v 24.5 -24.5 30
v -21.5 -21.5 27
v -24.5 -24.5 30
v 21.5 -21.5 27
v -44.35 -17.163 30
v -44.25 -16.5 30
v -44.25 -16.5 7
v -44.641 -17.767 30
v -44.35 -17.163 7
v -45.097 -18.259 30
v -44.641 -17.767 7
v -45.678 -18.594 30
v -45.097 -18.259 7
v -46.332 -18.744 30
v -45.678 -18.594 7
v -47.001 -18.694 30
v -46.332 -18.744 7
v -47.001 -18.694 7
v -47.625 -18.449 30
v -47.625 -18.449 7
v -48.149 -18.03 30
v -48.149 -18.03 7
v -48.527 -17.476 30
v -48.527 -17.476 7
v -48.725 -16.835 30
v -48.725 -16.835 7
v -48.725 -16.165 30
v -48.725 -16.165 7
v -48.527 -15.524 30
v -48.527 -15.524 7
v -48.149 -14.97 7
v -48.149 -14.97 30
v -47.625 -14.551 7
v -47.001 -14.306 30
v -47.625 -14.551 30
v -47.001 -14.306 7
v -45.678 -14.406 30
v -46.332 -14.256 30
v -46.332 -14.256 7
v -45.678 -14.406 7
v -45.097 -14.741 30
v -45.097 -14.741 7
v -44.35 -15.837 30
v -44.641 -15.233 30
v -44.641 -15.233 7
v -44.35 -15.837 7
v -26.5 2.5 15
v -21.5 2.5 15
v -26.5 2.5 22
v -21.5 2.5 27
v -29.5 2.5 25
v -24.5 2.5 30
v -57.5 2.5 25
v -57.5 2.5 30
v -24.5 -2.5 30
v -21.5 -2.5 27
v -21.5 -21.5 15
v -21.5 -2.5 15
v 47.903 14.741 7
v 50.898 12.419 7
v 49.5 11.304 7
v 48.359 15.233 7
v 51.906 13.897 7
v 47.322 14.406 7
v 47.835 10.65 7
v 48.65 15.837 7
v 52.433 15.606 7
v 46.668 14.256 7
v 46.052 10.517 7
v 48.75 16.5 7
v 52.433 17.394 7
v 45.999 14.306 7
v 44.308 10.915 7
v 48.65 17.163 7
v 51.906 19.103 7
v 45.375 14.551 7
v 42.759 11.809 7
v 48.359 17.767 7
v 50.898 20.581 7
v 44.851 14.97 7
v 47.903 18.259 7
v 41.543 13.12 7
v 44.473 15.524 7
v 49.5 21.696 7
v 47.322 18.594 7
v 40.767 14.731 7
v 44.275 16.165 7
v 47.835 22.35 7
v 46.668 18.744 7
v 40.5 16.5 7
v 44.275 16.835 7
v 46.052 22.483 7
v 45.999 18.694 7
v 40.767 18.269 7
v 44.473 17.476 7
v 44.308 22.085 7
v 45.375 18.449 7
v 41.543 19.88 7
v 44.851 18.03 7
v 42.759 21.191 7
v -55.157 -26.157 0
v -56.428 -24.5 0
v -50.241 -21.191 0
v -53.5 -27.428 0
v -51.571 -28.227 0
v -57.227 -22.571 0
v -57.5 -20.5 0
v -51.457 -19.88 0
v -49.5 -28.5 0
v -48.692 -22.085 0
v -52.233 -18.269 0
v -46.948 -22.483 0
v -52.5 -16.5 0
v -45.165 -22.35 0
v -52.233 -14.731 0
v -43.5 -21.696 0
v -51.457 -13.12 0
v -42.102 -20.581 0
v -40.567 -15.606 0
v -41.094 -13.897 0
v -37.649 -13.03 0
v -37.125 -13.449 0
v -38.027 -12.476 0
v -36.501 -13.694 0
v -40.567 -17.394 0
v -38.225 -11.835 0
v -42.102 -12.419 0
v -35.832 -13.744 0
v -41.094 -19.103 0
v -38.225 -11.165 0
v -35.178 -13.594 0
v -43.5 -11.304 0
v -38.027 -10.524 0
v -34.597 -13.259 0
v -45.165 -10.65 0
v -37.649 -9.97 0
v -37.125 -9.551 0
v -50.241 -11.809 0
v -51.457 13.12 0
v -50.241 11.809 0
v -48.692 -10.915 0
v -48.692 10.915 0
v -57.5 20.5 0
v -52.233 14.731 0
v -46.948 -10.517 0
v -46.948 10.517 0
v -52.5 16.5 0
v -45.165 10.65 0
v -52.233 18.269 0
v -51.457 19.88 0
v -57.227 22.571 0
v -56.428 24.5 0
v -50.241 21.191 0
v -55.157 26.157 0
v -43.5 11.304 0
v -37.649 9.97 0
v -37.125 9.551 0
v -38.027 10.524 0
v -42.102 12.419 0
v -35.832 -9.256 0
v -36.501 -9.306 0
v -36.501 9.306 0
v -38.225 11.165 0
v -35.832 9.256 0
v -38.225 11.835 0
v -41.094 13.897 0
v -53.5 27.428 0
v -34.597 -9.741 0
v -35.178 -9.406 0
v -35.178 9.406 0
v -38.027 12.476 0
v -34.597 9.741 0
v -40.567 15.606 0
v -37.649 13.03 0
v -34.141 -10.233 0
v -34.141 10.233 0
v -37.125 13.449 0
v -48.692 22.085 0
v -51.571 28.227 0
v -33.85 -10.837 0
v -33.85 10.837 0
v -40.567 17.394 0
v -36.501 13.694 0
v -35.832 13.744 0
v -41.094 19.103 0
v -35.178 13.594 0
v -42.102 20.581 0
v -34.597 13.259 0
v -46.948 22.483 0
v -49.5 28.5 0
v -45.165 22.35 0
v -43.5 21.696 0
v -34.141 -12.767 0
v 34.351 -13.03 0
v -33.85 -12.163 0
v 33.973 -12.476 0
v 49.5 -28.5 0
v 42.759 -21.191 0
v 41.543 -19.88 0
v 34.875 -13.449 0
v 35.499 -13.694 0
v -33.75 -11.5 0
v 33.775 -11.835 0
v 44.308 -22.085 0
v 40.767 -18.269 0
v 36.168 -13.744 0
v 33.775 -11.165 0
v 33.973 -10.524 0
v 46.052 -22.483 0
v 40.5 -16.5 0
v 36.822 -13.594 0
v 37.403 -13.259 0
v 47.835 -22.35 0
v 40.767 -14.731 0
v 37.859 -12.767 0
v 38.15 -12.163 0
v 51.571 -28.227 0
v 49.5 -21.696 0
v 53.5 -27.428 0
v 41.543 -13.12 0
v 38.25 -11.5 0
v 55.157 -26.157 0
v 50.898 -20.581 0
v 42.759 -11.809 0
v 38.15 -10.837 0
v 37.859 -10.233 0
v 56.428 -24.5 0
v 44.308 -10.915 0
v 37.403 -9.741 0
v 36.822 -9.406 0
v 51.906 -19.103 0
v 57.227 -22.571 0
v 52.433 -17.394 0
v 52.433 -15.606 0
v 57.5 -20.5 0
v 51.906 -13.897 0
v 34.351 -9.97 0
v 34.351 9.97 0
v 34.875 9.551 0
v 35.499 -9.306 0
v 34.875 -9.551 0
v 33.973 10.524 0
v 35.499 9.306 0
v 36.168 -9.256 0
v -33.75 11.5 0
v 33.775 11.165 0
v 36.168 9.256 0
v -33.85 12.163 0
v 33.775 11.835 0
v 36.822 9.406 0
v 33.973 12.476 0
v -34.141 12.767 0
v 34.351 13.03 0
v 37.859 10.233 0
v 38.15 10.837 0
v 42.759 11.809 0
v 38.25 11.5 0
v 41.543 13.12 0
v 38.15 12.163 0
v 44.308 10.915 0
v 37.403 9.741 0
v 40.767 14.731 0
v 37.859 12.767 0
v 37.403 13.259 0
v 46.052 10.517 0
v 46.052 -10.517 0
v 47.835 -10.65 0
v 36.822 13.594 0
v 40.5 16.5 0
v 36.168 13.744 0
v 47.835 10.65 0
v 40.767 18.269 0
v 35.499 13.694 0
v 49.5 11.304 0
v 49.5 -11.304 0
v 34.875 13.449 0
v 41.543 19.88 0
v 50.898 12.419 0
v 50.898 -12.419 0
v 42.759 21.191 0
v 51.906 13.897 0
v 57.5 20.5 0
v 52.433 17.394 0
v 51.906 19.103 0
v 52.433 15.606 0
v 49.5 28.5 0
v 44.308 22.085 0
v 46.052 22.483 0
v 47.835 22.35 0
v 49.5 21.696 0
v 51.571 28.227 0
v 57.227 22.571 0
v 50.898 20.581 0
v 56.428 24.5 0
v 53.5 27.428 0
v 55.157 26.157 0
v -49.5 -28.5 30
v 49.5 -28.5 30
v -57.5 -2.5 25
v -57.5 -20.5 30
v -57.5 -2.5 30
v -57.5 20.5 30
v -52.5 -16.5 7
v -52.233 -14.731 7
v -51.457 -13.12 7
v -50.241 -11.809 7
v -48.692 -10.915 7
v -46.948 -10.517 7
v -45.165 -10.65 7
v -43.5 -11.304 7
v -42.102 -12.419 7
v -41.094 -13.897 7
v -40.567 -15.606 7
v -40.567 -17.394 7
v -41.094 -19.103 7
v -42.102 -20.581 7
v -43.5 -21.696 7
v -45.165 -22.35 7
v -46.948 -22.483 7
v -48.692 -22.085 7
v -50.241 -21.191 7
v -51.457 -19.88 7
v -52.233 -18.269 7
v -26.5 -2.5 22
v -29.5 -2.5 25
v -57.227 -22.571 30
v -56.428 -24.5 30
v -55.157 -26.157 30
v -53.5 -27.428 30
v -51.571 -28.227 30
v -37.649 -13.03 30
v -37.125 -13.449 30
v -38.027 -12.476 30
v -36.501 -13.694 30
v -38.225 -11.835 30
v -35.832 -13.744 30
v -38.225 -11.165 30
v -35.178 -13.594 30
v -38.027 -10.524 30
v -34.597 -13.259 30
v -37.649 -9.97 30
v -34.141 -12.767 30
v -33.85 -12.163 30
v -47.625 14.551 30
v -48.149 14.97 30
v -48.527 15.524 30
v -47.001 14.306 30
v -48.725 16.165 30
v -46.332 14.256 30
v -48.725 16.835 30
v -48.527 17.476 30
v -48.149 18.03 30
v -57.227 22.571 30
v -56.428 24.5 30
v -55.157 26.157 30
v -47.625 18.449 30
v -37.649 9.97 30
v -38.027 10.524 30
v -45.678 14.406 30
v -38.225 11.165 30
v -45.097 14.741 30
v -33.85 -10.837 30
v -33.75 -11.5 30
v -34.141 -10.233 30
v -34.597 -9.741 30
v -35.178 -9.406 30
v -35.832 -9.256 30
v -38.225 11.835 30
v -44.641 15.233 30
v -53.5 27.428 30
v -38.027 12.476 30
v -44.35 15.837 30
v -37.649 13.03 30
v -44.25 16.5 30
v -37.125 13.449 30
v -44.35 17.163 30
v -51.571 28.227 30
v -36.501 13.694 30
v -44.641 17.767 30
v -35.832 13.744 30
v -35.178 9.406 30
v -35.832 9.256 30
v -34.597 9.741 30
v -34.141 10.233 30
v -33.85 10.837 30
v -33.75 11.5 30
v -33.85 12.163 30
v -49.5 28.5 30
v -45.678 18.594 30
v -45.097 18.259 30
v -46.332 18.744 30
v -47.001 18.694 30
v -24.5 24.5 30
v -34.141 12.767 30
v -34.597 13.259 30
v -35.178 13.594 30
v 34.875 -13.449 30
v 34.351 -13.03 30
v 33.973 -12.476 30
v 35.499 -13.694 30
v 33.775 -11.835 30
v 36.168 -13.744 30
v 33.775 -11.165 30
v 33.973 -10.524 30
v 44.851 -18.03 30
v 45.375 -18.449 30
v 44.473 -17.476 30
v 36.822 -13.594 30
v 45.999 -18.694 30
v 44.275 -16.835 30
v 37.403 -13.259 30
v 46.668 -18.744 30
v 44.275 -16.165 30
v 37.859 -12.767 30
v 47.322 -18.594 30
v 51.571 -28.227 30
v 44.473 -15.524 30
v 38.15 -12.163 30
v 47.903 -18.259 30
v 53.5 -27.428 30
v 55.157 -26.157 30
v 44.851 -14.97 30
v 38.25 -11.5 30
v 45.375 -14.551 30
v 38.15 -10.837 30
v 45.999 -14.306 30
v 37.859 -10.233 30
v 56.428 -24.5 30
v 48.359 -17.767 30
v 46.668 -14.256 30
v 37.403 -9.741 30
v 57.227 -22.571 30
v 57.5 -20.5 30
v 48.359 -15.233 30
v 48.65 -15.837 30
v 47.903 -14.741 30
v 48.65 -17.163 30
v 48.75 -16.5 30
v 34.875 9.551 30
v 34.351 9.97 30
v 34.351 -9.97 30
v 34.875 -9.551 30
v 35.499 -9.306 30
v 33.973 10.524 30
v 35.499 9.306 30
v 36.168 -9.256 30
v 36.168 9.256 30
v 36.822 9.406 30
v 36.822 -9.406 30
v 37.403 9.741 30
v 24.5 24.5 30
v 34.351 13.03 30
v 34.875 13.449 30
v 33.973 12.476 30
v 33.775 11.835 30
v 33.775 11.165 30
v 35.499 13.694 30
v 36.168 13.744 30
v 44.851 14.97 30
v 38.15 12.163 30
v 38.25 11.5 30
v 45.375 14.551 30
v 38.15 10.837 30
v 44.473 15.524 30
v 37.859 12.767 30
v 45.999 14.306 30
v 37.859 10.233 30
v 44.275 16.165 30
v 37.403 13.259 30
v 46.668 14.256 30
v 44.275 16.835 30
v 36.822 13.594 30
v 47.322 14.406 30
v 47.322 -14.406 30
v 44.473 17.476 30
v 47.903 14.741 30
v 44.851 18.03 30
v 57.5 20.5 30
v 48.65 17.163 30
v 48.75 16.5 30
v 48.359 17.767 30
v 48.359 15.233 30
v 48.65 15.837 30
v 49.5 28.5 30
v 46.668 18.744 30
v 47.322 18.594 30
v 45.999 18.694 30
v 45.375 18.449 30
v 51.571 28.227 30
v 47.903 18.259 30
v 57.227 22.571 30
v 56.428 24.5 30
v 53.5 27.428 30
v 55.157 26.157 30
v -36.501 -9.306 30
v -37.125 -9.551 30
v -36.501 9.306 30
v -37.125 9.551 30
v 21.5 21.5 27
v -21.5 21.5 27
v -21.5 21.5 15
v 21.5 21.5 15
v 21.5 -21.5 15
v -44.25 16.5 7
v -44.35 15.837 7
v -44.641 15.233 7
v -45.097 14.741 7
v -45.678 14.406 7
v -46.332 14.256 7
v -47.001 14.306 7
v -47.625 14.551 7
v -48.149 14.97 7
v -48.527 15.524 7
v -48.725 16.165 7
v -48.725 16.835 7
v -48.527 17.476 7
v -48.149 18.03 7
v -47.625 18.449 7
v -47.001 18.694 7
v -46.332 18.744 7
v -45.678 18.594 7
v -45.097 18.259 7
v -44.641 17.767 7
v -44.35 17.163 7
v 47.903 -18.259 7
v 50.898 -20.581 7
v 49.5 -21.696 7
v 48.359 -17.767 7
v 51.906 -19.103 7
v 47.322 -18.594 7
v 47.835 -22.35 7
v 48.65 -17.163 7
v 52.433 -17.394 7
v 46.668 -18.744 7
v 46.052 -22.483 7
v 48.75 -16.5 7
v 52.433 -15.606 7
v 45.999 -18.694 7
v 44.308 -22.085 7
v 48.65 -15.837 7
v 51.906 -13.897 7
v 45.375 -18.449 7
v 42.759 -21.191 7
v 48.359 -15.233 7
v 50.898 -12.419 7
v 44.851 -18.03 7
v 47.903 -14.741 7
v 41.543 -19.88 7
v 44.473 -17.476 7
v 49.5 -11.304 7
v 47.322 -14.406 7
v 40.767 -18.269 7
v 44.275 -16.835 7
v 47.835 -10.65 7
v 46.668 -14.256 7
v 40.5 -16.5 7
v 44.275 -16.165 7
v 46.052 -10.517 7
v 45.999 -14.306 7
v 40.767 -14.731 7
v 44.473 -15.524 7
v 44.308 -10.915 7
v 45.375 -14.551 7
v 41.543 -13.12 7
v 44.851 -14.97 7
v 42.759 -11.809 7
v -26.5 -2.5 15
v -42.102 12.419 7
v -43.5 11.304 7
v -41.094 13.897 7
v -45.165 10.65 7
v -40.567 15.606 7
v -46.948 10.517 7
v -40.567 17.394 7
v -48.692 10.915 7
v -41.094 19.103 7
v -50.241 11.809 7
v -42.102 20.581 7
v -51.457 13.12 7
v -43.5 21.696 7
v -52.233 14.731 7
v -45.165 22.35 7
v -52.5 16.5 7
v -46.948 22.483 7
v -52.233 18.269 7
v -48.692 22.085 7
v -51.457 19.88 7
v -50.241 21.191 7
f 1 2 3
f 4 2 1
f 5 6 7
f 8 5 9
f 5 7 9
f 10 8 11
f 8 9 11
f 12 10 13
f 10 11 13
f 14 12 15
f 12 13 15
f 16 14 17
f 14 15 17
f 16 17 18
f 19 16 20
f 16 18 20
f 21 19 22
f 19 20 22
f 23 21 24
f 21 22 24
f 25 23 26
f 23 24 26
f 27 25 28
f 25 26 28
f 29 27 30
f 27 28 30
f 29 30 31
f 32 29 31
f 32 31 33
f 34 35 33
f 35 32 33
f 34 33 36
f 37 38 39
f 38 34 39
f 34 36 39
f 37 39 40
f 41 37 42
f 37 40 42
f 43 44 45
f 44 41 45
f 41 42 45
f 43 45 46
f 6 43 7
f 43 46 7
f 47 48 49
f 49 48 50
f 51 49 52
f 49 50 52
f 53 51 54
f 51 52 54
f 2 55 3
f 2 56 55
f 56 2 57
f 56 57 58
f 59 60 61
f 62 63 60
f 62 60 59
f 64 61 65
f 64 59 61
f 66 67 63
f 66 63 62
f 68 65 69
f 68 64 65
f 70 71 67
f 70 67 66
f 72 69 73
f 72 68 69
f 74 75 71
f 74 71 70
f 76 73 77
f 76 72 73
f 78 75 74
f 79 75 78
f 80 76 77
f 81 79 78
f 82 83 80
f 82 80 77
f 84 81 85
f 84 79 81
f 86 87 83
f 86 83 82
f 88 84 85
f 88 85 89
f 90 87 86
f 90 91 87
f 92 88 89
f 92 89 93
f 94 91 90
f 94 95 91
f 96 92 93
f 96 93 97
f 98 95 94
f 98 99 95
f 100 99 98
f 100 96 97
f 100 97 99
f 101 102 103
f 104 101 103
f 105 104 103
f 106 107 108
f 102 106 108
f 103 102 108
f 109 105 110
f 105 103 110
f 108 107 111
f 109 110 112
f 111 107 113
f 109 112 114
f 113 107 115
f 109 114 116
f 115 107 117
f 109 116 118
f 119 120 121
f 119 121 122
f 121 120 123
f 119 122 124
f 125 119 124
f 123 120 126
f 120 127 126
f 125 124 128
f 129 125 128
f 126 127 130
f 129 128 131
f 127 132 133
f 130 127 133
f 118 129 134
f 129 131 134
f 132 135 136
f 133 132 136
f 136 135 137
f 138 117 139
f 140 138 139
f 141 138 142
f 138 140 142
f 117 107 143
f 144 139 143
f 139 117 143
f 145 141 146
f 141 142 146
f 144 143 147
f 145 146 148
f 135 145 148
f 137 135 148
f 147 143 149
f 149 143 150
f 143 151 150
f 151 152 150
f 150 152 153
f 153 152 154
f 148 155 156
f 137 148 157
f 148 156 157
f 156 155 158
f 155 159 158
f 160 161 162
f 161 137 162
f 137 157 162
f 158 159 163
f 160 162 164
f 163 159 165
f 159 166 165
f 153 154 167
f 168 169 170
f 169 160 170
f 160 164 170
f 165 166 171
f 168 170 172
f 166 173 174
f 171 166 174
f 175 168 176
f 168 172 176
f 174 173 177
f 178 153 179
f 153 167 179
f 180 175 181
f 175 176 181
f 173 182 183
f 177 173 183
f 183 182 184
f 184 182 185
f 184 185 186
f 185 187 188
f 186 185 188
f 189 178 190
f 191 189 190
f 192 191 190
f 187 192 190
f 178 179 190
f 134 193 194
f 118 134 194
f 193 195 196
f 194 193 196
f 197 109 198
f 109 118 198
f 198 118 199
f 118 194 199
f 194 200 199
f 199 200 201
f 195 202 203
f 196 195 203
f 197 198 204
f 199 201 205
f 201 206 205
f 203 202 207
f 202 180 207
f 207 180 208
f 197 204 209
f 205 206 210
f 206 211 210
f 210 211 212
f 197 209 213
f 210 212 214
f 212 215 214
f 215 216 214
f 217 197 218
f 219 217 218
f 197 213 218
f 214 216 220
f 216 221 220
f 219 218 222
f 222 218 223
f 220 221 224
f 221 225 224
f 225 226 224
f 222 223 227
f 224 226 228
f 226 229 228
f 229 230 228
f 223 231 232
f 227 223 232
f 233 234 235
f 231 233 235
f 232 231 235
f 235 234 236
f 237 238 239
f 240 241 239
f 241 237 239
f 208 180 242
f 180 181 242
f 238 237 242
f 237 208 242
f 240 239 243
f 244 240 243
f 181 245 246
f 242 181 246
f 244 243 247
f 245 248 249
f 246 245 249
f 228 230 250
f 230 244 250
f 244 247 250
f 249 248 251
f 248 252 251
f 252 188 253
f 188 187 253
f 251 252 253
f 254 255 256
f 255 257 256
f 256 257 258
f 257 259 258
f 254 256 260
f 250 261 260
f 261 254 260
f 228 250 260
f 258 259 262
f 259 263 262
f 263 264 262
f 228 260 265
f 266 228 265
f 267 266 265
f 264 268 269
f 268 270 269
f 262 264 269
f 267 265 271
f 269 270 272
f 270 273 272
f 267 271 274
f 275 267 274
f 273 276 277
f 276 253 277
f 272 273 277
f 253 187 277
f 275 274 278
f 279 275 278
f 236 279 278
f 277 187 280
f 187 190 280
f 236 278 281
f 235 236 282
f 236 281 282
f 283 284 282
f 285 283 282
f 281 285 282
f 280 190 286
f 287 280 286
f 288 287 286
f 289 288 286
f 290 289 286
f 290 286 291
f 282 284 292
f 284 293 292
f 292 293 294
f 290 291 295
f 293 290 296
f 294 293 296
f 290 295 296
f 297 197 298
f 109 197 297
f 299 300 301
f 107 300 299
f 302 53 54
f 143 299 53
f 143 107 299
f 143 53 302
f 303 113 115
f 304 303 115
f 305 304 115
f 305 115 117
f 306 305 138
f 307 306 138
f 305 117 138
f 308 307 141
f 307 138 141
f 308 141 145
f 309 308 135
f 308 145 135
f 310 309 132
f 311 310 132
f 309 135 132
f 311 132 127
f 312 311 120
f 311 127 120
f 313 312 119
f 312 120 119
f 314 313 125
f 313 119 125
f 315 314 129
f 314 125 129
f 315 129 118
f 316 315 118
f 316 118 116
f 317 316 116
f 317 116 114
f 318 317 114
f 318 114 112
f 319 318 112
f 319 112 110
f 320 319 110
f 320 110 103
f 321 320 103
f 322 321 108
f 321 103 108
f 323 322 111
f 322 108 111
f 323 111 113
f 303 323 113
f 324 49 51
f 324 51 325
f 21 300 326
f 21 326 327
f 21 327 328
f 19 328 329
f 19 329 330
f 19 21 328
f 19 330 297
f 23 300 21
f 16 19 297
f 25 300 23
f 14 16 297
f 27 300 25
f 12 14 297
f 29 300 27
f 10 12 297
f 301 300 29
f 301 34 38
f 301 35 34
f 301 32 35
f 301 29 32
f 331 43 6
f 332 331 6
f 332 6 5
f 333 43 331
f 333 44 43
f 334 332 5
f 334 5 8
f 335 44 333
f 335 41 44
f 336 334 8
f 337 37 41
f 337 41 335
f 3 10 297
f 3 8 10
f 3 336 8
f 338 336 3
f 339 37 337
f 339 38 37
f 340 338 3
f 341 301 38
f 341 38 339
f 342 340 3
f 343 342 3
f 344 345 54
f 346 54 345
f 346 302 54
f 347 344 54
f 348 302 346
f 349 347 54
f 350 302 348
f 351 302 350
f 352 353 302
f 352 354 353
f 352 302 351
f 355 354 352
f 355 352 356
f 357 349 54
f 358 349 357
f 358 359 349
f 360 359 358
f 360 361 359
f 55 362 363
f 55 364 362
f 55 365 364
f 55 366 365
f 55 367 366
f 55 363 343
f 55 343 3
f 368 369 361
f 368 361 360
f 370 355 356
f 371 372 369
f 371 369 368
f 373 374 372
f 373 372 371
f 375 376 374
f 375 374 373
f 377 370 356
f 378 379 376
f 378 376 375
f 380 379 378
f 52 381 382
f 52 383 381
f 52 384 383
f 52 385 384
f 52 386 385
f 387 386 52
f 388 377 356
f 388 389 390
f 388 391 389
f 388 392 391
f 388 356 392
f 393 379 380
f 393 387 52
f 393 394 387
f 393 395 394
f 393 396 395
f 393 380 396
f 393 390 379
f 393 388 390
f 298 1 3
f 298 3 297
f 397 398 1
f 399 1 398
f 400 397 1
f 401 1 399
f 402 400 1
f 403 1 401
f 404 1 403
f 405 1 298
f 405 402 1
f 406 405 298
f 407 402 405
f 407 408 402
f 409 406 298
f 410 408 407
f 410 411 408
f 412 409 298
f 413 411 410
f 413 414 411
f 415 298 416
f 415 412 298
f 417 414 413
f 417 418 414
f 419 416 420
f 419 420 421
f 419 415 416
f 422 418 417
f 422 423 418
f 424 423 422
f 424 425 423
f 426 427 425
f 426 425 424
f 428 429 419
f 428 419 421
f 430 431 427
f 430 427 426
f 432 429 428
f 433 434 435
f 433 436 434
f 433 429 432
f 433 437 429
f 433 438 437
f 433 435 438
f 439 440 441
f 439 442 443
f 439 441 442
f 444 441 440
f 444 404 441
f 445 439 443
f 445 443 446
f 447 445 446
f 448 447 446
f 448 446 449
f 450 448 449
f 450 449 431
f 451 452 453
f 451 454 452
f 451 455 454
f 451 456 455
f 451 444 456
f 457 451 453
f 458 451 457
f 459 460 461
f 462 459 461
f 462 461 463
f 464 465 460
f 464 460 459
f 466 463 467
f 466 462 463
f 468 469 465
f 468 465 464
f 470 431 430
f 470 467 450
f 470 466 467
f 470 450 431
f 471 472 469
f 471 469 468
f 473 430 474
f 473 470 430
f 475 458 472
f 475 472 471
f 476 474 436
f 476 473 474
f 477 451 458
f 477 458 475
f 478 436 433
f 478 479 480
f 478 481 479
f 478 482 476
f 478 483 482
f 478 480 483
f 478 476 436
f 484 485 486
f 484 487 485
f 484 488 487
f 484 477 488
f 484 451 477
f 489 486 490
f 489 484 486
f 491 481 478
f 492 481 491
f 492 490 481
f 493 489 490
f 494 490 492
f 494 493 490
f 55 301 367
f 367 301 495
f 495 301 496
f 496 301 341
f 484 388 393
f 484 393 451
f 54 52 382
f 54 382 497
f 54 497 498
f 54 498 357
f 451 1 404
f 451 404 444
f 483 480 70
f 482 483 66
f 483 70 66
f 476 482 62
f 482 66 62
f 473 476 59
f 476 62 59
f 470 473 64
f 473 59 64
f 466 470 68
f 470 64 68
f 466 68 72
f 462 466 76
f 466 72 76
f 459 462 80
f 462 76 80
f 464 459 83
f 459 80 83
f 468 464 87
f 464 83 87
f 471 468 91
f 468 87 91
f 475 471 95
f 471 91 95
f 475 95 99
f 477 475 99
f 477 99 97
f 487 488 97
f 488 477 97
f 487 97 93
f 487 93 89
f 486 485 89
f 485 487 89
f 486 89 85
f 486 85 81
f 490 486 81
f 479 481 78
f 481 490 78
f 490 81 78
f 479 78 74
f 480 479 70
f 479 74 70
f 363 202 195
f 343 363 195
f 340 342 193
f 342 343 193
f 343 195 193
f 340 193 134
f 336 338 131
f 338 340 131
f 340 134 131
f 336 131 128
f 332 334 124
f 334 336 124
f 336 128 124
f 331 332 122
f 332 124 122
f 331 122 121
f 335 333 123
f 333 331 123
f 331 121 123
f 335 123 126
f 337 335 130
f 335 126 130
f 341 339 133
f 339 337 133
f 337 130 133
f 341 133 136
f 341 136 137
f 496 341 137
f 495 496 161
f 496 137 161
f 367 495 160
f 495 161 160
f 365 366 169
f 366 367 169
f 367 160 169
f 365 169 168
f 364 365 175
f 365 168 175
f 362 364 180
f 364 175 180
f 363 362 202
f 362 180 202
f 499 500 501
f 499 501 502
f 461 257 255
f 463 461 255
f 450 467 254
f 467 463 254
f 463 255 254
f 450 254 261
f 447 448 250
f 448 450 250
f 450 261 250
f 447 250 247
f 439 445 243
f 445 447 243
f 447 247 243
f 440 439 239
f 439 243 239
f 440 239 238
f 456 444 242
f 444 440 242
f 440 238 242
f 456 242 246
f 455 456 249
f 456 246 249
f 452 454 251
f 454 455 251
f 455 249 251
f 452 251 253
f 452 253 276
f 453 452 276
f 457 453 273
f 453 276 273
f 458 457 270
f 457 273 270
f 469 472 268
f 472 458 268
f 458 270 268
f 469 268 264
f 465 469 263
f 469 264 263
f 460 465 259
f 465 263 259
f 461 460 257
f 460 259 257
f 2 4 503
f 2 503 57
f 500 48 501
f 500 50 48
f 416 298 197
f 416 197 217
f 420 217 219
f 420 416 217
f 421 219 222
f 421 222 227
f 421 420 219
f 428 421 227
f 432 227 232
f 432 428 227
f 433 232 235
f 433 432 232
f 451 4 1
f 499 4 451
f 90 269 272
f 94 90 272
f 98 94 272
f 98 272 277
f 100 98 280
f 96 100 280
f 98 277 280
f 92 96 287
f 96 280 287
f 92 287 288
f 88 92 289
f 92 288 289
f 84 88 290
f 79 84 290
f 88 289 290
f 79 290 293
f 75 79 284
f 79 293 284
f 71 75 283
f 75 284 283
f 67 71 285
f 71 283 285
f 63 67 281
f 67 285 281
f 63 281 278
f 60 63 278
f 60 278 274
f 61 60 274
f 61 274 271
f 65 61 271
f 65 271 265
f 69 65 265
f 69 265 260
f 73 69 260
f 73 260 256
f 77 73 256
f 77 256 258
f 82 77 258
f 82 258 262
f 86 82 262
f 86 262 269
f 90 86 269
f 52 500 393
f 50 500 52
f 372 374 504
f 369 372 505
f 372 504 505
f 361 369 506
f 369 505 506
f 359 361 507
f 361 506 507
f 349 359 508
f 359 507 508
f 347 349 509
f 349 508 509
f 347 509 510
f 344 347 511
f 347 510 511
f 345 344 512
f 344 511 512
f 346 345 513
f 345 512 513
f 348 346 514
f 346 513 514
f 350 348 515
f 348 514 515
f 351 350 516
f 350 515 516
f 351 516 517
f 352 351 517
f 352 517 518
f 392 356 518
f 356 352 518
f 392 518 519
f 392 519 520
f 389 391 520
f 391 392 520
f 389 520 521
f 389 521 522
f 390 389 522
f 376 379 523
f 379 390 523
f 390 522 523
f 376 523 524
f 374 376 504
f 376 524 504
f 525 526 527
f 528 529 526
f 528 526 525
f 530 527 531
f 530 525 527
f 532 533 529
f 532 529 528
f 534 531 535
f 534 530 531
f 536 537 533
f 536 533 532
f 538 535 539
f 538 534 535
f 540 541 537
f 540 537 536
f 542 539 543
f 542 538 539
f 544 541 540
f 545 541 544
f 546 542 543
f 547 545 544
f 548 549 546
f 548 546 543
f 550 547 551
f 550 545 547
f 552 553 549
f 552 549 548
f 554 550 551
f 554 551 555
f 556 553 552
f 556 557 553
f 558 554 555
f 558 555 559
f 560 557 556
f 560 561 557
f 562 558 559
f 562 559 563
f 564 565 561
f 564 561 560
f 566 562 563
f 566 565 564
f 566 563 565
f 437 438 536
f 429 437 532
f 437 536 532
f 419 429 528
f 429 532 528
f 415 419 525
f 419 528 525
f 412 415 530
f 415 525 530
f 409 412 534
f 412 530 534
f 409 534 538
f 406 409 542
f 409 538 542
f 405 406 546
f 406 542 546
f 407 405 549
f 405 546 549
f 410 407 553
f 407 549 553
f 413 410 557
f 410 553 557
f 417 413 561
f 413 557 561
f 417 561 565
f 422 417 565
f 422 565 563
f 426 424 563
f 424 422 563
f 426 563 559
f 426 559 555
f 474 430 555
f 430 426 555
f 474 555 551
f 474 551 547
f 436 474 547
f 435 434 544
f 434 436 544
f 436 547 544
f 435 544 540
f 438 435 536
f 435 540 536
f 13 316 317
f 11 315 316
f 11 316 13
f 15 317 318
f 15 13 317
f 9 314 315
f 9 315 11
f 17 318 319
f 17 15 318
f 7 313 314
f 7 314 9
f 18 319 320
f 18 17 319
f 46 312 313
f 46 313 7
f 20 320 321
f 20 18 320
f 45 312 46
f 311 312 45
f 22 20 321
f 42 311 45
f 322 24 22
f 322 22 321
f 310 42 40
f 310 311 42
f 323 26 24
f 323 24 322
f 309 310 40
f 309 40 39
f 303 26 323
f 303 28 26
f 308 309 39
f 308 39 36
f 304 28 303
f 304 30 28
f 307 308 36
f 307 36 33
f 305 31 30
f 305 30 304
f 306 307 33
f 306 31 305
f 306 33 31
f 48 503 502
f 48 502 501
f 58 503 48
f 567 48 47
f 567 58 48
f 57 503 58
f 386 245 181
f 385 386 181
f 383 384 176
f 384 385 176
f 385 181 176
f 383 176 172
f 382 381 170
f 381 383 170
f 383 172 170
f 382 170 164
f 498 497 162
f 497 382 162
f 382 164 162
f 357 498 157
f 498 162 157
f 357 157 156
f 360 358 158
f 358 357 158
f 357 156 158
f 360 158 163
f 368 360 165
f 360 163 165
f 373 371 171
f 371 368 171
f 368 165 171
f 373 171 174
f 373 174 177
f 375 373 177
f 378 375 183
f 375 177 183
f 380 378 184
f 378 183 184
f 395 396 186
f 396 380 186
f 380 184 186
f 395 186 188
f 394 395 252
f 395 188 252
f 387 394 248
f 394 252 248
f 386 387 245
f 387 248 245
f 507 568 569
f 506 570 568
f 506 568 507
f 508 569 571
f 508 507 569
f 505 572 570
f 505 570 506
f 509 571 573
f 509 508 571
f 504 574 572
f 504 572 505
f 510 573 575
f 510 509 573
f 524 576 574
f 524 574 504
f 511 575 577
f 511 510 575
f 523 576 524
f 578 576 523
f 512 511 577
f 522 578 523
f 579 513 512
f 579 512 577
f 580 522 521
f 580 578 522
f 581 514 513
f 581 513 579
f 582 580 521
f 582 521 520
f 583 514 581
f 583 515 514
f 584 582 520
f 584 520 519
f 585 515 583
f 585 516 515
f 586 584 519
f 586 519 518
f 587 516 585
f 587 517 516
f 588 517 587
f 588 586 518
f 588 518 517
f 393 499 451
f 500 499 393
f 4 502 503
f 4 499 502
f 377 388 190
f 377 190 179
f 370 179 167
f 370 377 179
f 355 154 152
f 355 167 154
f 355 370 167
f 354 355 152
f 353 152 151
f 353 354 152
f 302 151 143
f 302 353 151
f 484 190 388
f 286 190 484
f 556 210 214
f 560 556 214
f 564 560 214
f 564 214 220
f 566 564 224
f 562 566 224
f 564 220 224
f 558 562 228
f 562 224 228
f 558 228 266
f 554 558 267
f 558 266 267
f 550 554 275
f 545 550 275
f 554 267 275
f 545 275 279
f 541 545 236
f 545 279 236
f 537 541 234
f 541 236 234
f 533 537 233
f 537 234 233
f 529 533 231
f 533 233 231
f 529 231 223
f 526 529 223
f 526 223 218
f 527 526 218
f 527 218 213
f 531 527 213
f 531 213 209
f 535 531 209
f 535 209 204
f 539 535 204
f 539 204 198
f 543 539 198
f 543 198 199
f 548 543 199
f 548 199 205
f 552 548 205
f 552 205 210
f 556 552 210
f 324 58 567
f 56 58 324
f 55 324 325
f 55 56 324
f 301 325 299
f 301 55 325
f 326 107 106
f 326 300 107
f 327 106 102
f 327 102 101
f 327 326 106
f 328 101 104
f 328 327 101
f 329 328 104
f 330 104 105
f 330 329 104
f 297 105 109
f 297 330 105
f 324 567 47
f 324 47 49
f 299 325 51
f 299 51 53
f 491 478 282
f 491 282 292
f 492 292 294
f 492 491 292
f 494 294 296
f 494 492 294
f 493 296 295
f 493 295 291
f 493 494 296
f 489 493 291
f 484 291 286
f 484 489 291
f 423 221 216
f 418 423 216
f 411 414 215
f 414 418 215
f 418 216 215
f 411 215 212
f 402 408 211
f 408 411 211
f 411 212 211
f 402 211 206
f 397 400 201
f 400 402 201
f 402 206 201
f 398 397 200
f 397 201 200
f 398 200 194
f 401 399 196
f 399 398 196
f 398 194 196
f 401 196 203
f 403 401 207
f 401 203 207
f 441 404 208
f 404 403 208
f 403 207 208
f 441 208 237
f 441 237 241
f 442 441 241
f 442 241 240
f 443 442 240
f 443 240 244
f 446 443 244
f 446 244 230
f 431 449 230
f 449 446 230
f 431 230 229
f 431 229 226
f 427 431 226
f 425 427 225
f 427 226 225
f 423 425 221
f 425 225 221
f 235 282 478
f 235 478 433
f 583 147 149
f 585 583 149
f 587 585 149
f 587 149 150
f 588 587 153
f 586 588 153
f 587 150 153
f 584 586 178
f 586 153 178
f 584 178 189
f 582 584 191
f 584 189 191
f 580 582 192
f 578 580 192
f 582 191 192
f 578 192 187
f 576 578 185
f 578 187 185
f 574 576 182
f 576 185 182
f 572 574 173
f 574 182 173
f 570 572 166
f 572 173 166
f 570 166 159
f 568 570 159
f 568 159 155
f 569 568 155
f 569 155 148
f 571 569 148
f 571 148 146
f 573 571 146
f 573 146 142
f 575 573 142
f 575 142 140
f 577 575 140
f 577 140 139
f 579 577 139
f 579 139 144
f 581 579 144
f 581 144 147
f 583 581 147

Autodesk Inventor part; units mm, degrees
ref_plane "YZ Plane" through (0, 0, 0) normal (1, 0, 0) x (0, 1, 0)
ref_plane "XZ Plane" through (0, 0, 0) normal (0, 1, 0) x (-1, 0, 0)
ref_plane "XY Plane" through (0, 0, 0) normal (0, 0, 1) x (1, 0, 0)
sketch "Sketch1" plane through (0, 0, 0) normal (0, 0, 1) x (1, 0, 0)
  line L0 (57.5, -28.5) -> (-57.5, -28.5)
  line L1 (-57.5, -28.5) -> (-57.5, 28.5)
  line L2 (-57.5, 28.5) -> (57.5, 28.5)
  line L3 (57.5, 28.5) -> (57.5, -28.5)
  line L4 (57.5, -28.5) -> (-57.5, 28.5) construction
  line L5 (-57.5, -28.5) -> (57.5, 28.5) construction
  line L6 (46.5, -16.5) -> (-46.5, -16.5) construction
  line L7 (-46.5, -16.5) -> (-46.5, 16.5) construction
  line L8 (-46.5, 16.5) -> (46.5, 16.5) construction
  line L9 (46.5, 16.5) -> (46.5, -16.5) construction
  line L10 (46.5, -16.5) -> (-46.5, 16.5) construction
  line L11 (-46.5, -16.5) -> (46.5, 16.5) construction
  line L12 (36, -11.5) -> (-36, -11.5) construction
  line L13 (-36, -11.5) -> (-36, 11.5) construction
  line L14 (-36, 11.5) -> (36, 11.5) construction
  line L15 (36, 11.5) -> (36, -11.5) construction
  line L16 (36, -11.5) -> (-36, 11.5) construction
  line L17 (-36, -11.5) -> (36, 11.5) construction
  circle A0 centre (-46.5, 16.5) radius 2.25
  circle A1 centre (-36, 11.5) radius 2.25
  circle A2 centre (-46.5, -16.5) radius 2.25
  circle A3 centre (-36, -11.5) radius 2.25
  circle A4 centre (46.5, -16.5) radius 2.25
  circle A5 centre (36, -11.5) radius 2.25
  circle A6 centre (36, 11.5) radius 2.25
  circle A7 centre (46.5, 16.5) radius 2.25
  point P0 (0, 0)
  dimension "d0" = 115
  dimension "d1" = 57
  dimension "d2" = 93
  dimension "d3" = 33
  dimension "d4" = 72
  dimension "d5" = 23
  dimension "d6" = 4.5
extrude "Extrusion1" add sketch "Sketch1" along normal blind 30
sketch "Sketch2" plane through (0, 0, 0) normal (0, 0, -1) x (-1, 0, 0)
  circle A0 centre (-46.5, 16.5) radius 2.25 projected
  circle A1 centre (-36, 11.5) radius 2.25 projected
  circle A2 centre (-36, -11.5) radius 2.25 projected
  circle A3 centre (-46.5, -16.5) radius 2.25 projected
  circle A4 centre (36, -11.5) radius 2.25 projected
  circle A5 centre (46.5, -16.5) radius 2.25 projected
  circle A6 centre (36, 11.5) radius 2.25 projected
  circle A7 centre (46.5, 16.5) radius 2.25 projected
  line L0 (-57.5, -28.5) -> (57.5, -28.5) projected
  line L1 (57.5, -28.5) -> (57.5, 28.5) projected
  line L2 (57.5, 28.5) -> (-57.5, 28.5) projected
  line L3 (-57.5, 28.5) -> (-57.5, -28.5) projected
  circle A8 centre (-46.5, 16.5) radius 2.25 projected
  circle A9 centre (-46.5, 16.5) radius 6
  circle A10 centre (-46.5, -16.5) radius 2.25 projected
  circle A11 centre (-46.5, -16.5) radius 6
  circle A12 centre (46.5, -16.5) radius 6
  circle A13 centre (46.5, 16.5) radius 6
  point P0 (0, 0)
  dimension "d9" = 12
extrude "Extrusion2" cut sketch "Sketch2" against normal blind 7 contours A9 | A11 | A12 | A13
sketch "Sketch6" plane through (0, 0, 30) normal (0, 0, 1) x (1, 0, 0)
  line L0 (21.5, -21.5) -> (-21.5, -21.5)
  line L1 (-21.5, -21.5) -> (-21.5, 21.5)
  line L2 (-21.5, 21.5) -> (21.5, 21.5)
  line L3 (21.5, 21.5) -> (21.5, -21.5)
  line L4 (21.5, -21.5) -> (-21.5, 21.5) construction
  line L5 (-21.5, -21.5) -> (21.5, 21.5) construction
  point P0 (0, 0)
  dimension "d27" = 43
  dimension "d28" = 43
extrude "Extrusion5" cut sketch "Sketch6" against normal blind 15
sketch "Sketch7" plane through (0, 0, 0) normal (0, 1, 0) x (-1, 0, 0)
  line L0 (21.5, 30) -> (-21.5, 30) projected
  line L1 (21.5, 30) -> (21.5, 15) projected
  line L2 (21.5, 15) -> (-21.5, 15) projected
  line L3 (-21.5, 30) -> (-21.5, 15) projected
  line L4 (57.5, 0) -> (-57.5, 0) projected
  line L5 (57.5, 0) -> (57.5, 30) projected
  line L6 (-57.5, 30) -> (57.5, 30) projected
  line L7 (-57.5, 0) -> (-57.5, 30) projected
  line L8 (57.5, 30) -> (21.5, 30)
  line L9 (21.5, 30) -> (21.5, 15) projected
  line L10 (21.5, 15) -> (26.5, 15)
  line L11 (26.5, 15) -> (26.5, 25)
  line L12 (26.5, 25) -> (57.5, 25)
  line L13 (57.5, 30) -> (57.5, 25)
  line L14 (57.5, 0) -> (57.5, 30) projected
  point P0 (0, 0)
  dimension "d31" = 5
  dimension "d32" = 5
extrude "Extrusion6" cut sketch "Sketch7" along normal mid plane 5 contours L6 L5 L12 L11 L10 L1
chamfer "Chamfer2" distance 3 angle 45 6 edges at (-21.5, 12, 30) (0, 21.5, 30) (-21.5, -12, 30) (0, -21.5, 30) (21.5, 0, 30) (-26.5, 0, 25)
fillet "Fillet2" radius 8 4 edges at (-57.5, 28.5, 15) (-57.5, -28.5, 15) (57.5, -28.5, 15) (57.5, 28.5, 15)
properties part number "sujetador guia ejercedor presion"
